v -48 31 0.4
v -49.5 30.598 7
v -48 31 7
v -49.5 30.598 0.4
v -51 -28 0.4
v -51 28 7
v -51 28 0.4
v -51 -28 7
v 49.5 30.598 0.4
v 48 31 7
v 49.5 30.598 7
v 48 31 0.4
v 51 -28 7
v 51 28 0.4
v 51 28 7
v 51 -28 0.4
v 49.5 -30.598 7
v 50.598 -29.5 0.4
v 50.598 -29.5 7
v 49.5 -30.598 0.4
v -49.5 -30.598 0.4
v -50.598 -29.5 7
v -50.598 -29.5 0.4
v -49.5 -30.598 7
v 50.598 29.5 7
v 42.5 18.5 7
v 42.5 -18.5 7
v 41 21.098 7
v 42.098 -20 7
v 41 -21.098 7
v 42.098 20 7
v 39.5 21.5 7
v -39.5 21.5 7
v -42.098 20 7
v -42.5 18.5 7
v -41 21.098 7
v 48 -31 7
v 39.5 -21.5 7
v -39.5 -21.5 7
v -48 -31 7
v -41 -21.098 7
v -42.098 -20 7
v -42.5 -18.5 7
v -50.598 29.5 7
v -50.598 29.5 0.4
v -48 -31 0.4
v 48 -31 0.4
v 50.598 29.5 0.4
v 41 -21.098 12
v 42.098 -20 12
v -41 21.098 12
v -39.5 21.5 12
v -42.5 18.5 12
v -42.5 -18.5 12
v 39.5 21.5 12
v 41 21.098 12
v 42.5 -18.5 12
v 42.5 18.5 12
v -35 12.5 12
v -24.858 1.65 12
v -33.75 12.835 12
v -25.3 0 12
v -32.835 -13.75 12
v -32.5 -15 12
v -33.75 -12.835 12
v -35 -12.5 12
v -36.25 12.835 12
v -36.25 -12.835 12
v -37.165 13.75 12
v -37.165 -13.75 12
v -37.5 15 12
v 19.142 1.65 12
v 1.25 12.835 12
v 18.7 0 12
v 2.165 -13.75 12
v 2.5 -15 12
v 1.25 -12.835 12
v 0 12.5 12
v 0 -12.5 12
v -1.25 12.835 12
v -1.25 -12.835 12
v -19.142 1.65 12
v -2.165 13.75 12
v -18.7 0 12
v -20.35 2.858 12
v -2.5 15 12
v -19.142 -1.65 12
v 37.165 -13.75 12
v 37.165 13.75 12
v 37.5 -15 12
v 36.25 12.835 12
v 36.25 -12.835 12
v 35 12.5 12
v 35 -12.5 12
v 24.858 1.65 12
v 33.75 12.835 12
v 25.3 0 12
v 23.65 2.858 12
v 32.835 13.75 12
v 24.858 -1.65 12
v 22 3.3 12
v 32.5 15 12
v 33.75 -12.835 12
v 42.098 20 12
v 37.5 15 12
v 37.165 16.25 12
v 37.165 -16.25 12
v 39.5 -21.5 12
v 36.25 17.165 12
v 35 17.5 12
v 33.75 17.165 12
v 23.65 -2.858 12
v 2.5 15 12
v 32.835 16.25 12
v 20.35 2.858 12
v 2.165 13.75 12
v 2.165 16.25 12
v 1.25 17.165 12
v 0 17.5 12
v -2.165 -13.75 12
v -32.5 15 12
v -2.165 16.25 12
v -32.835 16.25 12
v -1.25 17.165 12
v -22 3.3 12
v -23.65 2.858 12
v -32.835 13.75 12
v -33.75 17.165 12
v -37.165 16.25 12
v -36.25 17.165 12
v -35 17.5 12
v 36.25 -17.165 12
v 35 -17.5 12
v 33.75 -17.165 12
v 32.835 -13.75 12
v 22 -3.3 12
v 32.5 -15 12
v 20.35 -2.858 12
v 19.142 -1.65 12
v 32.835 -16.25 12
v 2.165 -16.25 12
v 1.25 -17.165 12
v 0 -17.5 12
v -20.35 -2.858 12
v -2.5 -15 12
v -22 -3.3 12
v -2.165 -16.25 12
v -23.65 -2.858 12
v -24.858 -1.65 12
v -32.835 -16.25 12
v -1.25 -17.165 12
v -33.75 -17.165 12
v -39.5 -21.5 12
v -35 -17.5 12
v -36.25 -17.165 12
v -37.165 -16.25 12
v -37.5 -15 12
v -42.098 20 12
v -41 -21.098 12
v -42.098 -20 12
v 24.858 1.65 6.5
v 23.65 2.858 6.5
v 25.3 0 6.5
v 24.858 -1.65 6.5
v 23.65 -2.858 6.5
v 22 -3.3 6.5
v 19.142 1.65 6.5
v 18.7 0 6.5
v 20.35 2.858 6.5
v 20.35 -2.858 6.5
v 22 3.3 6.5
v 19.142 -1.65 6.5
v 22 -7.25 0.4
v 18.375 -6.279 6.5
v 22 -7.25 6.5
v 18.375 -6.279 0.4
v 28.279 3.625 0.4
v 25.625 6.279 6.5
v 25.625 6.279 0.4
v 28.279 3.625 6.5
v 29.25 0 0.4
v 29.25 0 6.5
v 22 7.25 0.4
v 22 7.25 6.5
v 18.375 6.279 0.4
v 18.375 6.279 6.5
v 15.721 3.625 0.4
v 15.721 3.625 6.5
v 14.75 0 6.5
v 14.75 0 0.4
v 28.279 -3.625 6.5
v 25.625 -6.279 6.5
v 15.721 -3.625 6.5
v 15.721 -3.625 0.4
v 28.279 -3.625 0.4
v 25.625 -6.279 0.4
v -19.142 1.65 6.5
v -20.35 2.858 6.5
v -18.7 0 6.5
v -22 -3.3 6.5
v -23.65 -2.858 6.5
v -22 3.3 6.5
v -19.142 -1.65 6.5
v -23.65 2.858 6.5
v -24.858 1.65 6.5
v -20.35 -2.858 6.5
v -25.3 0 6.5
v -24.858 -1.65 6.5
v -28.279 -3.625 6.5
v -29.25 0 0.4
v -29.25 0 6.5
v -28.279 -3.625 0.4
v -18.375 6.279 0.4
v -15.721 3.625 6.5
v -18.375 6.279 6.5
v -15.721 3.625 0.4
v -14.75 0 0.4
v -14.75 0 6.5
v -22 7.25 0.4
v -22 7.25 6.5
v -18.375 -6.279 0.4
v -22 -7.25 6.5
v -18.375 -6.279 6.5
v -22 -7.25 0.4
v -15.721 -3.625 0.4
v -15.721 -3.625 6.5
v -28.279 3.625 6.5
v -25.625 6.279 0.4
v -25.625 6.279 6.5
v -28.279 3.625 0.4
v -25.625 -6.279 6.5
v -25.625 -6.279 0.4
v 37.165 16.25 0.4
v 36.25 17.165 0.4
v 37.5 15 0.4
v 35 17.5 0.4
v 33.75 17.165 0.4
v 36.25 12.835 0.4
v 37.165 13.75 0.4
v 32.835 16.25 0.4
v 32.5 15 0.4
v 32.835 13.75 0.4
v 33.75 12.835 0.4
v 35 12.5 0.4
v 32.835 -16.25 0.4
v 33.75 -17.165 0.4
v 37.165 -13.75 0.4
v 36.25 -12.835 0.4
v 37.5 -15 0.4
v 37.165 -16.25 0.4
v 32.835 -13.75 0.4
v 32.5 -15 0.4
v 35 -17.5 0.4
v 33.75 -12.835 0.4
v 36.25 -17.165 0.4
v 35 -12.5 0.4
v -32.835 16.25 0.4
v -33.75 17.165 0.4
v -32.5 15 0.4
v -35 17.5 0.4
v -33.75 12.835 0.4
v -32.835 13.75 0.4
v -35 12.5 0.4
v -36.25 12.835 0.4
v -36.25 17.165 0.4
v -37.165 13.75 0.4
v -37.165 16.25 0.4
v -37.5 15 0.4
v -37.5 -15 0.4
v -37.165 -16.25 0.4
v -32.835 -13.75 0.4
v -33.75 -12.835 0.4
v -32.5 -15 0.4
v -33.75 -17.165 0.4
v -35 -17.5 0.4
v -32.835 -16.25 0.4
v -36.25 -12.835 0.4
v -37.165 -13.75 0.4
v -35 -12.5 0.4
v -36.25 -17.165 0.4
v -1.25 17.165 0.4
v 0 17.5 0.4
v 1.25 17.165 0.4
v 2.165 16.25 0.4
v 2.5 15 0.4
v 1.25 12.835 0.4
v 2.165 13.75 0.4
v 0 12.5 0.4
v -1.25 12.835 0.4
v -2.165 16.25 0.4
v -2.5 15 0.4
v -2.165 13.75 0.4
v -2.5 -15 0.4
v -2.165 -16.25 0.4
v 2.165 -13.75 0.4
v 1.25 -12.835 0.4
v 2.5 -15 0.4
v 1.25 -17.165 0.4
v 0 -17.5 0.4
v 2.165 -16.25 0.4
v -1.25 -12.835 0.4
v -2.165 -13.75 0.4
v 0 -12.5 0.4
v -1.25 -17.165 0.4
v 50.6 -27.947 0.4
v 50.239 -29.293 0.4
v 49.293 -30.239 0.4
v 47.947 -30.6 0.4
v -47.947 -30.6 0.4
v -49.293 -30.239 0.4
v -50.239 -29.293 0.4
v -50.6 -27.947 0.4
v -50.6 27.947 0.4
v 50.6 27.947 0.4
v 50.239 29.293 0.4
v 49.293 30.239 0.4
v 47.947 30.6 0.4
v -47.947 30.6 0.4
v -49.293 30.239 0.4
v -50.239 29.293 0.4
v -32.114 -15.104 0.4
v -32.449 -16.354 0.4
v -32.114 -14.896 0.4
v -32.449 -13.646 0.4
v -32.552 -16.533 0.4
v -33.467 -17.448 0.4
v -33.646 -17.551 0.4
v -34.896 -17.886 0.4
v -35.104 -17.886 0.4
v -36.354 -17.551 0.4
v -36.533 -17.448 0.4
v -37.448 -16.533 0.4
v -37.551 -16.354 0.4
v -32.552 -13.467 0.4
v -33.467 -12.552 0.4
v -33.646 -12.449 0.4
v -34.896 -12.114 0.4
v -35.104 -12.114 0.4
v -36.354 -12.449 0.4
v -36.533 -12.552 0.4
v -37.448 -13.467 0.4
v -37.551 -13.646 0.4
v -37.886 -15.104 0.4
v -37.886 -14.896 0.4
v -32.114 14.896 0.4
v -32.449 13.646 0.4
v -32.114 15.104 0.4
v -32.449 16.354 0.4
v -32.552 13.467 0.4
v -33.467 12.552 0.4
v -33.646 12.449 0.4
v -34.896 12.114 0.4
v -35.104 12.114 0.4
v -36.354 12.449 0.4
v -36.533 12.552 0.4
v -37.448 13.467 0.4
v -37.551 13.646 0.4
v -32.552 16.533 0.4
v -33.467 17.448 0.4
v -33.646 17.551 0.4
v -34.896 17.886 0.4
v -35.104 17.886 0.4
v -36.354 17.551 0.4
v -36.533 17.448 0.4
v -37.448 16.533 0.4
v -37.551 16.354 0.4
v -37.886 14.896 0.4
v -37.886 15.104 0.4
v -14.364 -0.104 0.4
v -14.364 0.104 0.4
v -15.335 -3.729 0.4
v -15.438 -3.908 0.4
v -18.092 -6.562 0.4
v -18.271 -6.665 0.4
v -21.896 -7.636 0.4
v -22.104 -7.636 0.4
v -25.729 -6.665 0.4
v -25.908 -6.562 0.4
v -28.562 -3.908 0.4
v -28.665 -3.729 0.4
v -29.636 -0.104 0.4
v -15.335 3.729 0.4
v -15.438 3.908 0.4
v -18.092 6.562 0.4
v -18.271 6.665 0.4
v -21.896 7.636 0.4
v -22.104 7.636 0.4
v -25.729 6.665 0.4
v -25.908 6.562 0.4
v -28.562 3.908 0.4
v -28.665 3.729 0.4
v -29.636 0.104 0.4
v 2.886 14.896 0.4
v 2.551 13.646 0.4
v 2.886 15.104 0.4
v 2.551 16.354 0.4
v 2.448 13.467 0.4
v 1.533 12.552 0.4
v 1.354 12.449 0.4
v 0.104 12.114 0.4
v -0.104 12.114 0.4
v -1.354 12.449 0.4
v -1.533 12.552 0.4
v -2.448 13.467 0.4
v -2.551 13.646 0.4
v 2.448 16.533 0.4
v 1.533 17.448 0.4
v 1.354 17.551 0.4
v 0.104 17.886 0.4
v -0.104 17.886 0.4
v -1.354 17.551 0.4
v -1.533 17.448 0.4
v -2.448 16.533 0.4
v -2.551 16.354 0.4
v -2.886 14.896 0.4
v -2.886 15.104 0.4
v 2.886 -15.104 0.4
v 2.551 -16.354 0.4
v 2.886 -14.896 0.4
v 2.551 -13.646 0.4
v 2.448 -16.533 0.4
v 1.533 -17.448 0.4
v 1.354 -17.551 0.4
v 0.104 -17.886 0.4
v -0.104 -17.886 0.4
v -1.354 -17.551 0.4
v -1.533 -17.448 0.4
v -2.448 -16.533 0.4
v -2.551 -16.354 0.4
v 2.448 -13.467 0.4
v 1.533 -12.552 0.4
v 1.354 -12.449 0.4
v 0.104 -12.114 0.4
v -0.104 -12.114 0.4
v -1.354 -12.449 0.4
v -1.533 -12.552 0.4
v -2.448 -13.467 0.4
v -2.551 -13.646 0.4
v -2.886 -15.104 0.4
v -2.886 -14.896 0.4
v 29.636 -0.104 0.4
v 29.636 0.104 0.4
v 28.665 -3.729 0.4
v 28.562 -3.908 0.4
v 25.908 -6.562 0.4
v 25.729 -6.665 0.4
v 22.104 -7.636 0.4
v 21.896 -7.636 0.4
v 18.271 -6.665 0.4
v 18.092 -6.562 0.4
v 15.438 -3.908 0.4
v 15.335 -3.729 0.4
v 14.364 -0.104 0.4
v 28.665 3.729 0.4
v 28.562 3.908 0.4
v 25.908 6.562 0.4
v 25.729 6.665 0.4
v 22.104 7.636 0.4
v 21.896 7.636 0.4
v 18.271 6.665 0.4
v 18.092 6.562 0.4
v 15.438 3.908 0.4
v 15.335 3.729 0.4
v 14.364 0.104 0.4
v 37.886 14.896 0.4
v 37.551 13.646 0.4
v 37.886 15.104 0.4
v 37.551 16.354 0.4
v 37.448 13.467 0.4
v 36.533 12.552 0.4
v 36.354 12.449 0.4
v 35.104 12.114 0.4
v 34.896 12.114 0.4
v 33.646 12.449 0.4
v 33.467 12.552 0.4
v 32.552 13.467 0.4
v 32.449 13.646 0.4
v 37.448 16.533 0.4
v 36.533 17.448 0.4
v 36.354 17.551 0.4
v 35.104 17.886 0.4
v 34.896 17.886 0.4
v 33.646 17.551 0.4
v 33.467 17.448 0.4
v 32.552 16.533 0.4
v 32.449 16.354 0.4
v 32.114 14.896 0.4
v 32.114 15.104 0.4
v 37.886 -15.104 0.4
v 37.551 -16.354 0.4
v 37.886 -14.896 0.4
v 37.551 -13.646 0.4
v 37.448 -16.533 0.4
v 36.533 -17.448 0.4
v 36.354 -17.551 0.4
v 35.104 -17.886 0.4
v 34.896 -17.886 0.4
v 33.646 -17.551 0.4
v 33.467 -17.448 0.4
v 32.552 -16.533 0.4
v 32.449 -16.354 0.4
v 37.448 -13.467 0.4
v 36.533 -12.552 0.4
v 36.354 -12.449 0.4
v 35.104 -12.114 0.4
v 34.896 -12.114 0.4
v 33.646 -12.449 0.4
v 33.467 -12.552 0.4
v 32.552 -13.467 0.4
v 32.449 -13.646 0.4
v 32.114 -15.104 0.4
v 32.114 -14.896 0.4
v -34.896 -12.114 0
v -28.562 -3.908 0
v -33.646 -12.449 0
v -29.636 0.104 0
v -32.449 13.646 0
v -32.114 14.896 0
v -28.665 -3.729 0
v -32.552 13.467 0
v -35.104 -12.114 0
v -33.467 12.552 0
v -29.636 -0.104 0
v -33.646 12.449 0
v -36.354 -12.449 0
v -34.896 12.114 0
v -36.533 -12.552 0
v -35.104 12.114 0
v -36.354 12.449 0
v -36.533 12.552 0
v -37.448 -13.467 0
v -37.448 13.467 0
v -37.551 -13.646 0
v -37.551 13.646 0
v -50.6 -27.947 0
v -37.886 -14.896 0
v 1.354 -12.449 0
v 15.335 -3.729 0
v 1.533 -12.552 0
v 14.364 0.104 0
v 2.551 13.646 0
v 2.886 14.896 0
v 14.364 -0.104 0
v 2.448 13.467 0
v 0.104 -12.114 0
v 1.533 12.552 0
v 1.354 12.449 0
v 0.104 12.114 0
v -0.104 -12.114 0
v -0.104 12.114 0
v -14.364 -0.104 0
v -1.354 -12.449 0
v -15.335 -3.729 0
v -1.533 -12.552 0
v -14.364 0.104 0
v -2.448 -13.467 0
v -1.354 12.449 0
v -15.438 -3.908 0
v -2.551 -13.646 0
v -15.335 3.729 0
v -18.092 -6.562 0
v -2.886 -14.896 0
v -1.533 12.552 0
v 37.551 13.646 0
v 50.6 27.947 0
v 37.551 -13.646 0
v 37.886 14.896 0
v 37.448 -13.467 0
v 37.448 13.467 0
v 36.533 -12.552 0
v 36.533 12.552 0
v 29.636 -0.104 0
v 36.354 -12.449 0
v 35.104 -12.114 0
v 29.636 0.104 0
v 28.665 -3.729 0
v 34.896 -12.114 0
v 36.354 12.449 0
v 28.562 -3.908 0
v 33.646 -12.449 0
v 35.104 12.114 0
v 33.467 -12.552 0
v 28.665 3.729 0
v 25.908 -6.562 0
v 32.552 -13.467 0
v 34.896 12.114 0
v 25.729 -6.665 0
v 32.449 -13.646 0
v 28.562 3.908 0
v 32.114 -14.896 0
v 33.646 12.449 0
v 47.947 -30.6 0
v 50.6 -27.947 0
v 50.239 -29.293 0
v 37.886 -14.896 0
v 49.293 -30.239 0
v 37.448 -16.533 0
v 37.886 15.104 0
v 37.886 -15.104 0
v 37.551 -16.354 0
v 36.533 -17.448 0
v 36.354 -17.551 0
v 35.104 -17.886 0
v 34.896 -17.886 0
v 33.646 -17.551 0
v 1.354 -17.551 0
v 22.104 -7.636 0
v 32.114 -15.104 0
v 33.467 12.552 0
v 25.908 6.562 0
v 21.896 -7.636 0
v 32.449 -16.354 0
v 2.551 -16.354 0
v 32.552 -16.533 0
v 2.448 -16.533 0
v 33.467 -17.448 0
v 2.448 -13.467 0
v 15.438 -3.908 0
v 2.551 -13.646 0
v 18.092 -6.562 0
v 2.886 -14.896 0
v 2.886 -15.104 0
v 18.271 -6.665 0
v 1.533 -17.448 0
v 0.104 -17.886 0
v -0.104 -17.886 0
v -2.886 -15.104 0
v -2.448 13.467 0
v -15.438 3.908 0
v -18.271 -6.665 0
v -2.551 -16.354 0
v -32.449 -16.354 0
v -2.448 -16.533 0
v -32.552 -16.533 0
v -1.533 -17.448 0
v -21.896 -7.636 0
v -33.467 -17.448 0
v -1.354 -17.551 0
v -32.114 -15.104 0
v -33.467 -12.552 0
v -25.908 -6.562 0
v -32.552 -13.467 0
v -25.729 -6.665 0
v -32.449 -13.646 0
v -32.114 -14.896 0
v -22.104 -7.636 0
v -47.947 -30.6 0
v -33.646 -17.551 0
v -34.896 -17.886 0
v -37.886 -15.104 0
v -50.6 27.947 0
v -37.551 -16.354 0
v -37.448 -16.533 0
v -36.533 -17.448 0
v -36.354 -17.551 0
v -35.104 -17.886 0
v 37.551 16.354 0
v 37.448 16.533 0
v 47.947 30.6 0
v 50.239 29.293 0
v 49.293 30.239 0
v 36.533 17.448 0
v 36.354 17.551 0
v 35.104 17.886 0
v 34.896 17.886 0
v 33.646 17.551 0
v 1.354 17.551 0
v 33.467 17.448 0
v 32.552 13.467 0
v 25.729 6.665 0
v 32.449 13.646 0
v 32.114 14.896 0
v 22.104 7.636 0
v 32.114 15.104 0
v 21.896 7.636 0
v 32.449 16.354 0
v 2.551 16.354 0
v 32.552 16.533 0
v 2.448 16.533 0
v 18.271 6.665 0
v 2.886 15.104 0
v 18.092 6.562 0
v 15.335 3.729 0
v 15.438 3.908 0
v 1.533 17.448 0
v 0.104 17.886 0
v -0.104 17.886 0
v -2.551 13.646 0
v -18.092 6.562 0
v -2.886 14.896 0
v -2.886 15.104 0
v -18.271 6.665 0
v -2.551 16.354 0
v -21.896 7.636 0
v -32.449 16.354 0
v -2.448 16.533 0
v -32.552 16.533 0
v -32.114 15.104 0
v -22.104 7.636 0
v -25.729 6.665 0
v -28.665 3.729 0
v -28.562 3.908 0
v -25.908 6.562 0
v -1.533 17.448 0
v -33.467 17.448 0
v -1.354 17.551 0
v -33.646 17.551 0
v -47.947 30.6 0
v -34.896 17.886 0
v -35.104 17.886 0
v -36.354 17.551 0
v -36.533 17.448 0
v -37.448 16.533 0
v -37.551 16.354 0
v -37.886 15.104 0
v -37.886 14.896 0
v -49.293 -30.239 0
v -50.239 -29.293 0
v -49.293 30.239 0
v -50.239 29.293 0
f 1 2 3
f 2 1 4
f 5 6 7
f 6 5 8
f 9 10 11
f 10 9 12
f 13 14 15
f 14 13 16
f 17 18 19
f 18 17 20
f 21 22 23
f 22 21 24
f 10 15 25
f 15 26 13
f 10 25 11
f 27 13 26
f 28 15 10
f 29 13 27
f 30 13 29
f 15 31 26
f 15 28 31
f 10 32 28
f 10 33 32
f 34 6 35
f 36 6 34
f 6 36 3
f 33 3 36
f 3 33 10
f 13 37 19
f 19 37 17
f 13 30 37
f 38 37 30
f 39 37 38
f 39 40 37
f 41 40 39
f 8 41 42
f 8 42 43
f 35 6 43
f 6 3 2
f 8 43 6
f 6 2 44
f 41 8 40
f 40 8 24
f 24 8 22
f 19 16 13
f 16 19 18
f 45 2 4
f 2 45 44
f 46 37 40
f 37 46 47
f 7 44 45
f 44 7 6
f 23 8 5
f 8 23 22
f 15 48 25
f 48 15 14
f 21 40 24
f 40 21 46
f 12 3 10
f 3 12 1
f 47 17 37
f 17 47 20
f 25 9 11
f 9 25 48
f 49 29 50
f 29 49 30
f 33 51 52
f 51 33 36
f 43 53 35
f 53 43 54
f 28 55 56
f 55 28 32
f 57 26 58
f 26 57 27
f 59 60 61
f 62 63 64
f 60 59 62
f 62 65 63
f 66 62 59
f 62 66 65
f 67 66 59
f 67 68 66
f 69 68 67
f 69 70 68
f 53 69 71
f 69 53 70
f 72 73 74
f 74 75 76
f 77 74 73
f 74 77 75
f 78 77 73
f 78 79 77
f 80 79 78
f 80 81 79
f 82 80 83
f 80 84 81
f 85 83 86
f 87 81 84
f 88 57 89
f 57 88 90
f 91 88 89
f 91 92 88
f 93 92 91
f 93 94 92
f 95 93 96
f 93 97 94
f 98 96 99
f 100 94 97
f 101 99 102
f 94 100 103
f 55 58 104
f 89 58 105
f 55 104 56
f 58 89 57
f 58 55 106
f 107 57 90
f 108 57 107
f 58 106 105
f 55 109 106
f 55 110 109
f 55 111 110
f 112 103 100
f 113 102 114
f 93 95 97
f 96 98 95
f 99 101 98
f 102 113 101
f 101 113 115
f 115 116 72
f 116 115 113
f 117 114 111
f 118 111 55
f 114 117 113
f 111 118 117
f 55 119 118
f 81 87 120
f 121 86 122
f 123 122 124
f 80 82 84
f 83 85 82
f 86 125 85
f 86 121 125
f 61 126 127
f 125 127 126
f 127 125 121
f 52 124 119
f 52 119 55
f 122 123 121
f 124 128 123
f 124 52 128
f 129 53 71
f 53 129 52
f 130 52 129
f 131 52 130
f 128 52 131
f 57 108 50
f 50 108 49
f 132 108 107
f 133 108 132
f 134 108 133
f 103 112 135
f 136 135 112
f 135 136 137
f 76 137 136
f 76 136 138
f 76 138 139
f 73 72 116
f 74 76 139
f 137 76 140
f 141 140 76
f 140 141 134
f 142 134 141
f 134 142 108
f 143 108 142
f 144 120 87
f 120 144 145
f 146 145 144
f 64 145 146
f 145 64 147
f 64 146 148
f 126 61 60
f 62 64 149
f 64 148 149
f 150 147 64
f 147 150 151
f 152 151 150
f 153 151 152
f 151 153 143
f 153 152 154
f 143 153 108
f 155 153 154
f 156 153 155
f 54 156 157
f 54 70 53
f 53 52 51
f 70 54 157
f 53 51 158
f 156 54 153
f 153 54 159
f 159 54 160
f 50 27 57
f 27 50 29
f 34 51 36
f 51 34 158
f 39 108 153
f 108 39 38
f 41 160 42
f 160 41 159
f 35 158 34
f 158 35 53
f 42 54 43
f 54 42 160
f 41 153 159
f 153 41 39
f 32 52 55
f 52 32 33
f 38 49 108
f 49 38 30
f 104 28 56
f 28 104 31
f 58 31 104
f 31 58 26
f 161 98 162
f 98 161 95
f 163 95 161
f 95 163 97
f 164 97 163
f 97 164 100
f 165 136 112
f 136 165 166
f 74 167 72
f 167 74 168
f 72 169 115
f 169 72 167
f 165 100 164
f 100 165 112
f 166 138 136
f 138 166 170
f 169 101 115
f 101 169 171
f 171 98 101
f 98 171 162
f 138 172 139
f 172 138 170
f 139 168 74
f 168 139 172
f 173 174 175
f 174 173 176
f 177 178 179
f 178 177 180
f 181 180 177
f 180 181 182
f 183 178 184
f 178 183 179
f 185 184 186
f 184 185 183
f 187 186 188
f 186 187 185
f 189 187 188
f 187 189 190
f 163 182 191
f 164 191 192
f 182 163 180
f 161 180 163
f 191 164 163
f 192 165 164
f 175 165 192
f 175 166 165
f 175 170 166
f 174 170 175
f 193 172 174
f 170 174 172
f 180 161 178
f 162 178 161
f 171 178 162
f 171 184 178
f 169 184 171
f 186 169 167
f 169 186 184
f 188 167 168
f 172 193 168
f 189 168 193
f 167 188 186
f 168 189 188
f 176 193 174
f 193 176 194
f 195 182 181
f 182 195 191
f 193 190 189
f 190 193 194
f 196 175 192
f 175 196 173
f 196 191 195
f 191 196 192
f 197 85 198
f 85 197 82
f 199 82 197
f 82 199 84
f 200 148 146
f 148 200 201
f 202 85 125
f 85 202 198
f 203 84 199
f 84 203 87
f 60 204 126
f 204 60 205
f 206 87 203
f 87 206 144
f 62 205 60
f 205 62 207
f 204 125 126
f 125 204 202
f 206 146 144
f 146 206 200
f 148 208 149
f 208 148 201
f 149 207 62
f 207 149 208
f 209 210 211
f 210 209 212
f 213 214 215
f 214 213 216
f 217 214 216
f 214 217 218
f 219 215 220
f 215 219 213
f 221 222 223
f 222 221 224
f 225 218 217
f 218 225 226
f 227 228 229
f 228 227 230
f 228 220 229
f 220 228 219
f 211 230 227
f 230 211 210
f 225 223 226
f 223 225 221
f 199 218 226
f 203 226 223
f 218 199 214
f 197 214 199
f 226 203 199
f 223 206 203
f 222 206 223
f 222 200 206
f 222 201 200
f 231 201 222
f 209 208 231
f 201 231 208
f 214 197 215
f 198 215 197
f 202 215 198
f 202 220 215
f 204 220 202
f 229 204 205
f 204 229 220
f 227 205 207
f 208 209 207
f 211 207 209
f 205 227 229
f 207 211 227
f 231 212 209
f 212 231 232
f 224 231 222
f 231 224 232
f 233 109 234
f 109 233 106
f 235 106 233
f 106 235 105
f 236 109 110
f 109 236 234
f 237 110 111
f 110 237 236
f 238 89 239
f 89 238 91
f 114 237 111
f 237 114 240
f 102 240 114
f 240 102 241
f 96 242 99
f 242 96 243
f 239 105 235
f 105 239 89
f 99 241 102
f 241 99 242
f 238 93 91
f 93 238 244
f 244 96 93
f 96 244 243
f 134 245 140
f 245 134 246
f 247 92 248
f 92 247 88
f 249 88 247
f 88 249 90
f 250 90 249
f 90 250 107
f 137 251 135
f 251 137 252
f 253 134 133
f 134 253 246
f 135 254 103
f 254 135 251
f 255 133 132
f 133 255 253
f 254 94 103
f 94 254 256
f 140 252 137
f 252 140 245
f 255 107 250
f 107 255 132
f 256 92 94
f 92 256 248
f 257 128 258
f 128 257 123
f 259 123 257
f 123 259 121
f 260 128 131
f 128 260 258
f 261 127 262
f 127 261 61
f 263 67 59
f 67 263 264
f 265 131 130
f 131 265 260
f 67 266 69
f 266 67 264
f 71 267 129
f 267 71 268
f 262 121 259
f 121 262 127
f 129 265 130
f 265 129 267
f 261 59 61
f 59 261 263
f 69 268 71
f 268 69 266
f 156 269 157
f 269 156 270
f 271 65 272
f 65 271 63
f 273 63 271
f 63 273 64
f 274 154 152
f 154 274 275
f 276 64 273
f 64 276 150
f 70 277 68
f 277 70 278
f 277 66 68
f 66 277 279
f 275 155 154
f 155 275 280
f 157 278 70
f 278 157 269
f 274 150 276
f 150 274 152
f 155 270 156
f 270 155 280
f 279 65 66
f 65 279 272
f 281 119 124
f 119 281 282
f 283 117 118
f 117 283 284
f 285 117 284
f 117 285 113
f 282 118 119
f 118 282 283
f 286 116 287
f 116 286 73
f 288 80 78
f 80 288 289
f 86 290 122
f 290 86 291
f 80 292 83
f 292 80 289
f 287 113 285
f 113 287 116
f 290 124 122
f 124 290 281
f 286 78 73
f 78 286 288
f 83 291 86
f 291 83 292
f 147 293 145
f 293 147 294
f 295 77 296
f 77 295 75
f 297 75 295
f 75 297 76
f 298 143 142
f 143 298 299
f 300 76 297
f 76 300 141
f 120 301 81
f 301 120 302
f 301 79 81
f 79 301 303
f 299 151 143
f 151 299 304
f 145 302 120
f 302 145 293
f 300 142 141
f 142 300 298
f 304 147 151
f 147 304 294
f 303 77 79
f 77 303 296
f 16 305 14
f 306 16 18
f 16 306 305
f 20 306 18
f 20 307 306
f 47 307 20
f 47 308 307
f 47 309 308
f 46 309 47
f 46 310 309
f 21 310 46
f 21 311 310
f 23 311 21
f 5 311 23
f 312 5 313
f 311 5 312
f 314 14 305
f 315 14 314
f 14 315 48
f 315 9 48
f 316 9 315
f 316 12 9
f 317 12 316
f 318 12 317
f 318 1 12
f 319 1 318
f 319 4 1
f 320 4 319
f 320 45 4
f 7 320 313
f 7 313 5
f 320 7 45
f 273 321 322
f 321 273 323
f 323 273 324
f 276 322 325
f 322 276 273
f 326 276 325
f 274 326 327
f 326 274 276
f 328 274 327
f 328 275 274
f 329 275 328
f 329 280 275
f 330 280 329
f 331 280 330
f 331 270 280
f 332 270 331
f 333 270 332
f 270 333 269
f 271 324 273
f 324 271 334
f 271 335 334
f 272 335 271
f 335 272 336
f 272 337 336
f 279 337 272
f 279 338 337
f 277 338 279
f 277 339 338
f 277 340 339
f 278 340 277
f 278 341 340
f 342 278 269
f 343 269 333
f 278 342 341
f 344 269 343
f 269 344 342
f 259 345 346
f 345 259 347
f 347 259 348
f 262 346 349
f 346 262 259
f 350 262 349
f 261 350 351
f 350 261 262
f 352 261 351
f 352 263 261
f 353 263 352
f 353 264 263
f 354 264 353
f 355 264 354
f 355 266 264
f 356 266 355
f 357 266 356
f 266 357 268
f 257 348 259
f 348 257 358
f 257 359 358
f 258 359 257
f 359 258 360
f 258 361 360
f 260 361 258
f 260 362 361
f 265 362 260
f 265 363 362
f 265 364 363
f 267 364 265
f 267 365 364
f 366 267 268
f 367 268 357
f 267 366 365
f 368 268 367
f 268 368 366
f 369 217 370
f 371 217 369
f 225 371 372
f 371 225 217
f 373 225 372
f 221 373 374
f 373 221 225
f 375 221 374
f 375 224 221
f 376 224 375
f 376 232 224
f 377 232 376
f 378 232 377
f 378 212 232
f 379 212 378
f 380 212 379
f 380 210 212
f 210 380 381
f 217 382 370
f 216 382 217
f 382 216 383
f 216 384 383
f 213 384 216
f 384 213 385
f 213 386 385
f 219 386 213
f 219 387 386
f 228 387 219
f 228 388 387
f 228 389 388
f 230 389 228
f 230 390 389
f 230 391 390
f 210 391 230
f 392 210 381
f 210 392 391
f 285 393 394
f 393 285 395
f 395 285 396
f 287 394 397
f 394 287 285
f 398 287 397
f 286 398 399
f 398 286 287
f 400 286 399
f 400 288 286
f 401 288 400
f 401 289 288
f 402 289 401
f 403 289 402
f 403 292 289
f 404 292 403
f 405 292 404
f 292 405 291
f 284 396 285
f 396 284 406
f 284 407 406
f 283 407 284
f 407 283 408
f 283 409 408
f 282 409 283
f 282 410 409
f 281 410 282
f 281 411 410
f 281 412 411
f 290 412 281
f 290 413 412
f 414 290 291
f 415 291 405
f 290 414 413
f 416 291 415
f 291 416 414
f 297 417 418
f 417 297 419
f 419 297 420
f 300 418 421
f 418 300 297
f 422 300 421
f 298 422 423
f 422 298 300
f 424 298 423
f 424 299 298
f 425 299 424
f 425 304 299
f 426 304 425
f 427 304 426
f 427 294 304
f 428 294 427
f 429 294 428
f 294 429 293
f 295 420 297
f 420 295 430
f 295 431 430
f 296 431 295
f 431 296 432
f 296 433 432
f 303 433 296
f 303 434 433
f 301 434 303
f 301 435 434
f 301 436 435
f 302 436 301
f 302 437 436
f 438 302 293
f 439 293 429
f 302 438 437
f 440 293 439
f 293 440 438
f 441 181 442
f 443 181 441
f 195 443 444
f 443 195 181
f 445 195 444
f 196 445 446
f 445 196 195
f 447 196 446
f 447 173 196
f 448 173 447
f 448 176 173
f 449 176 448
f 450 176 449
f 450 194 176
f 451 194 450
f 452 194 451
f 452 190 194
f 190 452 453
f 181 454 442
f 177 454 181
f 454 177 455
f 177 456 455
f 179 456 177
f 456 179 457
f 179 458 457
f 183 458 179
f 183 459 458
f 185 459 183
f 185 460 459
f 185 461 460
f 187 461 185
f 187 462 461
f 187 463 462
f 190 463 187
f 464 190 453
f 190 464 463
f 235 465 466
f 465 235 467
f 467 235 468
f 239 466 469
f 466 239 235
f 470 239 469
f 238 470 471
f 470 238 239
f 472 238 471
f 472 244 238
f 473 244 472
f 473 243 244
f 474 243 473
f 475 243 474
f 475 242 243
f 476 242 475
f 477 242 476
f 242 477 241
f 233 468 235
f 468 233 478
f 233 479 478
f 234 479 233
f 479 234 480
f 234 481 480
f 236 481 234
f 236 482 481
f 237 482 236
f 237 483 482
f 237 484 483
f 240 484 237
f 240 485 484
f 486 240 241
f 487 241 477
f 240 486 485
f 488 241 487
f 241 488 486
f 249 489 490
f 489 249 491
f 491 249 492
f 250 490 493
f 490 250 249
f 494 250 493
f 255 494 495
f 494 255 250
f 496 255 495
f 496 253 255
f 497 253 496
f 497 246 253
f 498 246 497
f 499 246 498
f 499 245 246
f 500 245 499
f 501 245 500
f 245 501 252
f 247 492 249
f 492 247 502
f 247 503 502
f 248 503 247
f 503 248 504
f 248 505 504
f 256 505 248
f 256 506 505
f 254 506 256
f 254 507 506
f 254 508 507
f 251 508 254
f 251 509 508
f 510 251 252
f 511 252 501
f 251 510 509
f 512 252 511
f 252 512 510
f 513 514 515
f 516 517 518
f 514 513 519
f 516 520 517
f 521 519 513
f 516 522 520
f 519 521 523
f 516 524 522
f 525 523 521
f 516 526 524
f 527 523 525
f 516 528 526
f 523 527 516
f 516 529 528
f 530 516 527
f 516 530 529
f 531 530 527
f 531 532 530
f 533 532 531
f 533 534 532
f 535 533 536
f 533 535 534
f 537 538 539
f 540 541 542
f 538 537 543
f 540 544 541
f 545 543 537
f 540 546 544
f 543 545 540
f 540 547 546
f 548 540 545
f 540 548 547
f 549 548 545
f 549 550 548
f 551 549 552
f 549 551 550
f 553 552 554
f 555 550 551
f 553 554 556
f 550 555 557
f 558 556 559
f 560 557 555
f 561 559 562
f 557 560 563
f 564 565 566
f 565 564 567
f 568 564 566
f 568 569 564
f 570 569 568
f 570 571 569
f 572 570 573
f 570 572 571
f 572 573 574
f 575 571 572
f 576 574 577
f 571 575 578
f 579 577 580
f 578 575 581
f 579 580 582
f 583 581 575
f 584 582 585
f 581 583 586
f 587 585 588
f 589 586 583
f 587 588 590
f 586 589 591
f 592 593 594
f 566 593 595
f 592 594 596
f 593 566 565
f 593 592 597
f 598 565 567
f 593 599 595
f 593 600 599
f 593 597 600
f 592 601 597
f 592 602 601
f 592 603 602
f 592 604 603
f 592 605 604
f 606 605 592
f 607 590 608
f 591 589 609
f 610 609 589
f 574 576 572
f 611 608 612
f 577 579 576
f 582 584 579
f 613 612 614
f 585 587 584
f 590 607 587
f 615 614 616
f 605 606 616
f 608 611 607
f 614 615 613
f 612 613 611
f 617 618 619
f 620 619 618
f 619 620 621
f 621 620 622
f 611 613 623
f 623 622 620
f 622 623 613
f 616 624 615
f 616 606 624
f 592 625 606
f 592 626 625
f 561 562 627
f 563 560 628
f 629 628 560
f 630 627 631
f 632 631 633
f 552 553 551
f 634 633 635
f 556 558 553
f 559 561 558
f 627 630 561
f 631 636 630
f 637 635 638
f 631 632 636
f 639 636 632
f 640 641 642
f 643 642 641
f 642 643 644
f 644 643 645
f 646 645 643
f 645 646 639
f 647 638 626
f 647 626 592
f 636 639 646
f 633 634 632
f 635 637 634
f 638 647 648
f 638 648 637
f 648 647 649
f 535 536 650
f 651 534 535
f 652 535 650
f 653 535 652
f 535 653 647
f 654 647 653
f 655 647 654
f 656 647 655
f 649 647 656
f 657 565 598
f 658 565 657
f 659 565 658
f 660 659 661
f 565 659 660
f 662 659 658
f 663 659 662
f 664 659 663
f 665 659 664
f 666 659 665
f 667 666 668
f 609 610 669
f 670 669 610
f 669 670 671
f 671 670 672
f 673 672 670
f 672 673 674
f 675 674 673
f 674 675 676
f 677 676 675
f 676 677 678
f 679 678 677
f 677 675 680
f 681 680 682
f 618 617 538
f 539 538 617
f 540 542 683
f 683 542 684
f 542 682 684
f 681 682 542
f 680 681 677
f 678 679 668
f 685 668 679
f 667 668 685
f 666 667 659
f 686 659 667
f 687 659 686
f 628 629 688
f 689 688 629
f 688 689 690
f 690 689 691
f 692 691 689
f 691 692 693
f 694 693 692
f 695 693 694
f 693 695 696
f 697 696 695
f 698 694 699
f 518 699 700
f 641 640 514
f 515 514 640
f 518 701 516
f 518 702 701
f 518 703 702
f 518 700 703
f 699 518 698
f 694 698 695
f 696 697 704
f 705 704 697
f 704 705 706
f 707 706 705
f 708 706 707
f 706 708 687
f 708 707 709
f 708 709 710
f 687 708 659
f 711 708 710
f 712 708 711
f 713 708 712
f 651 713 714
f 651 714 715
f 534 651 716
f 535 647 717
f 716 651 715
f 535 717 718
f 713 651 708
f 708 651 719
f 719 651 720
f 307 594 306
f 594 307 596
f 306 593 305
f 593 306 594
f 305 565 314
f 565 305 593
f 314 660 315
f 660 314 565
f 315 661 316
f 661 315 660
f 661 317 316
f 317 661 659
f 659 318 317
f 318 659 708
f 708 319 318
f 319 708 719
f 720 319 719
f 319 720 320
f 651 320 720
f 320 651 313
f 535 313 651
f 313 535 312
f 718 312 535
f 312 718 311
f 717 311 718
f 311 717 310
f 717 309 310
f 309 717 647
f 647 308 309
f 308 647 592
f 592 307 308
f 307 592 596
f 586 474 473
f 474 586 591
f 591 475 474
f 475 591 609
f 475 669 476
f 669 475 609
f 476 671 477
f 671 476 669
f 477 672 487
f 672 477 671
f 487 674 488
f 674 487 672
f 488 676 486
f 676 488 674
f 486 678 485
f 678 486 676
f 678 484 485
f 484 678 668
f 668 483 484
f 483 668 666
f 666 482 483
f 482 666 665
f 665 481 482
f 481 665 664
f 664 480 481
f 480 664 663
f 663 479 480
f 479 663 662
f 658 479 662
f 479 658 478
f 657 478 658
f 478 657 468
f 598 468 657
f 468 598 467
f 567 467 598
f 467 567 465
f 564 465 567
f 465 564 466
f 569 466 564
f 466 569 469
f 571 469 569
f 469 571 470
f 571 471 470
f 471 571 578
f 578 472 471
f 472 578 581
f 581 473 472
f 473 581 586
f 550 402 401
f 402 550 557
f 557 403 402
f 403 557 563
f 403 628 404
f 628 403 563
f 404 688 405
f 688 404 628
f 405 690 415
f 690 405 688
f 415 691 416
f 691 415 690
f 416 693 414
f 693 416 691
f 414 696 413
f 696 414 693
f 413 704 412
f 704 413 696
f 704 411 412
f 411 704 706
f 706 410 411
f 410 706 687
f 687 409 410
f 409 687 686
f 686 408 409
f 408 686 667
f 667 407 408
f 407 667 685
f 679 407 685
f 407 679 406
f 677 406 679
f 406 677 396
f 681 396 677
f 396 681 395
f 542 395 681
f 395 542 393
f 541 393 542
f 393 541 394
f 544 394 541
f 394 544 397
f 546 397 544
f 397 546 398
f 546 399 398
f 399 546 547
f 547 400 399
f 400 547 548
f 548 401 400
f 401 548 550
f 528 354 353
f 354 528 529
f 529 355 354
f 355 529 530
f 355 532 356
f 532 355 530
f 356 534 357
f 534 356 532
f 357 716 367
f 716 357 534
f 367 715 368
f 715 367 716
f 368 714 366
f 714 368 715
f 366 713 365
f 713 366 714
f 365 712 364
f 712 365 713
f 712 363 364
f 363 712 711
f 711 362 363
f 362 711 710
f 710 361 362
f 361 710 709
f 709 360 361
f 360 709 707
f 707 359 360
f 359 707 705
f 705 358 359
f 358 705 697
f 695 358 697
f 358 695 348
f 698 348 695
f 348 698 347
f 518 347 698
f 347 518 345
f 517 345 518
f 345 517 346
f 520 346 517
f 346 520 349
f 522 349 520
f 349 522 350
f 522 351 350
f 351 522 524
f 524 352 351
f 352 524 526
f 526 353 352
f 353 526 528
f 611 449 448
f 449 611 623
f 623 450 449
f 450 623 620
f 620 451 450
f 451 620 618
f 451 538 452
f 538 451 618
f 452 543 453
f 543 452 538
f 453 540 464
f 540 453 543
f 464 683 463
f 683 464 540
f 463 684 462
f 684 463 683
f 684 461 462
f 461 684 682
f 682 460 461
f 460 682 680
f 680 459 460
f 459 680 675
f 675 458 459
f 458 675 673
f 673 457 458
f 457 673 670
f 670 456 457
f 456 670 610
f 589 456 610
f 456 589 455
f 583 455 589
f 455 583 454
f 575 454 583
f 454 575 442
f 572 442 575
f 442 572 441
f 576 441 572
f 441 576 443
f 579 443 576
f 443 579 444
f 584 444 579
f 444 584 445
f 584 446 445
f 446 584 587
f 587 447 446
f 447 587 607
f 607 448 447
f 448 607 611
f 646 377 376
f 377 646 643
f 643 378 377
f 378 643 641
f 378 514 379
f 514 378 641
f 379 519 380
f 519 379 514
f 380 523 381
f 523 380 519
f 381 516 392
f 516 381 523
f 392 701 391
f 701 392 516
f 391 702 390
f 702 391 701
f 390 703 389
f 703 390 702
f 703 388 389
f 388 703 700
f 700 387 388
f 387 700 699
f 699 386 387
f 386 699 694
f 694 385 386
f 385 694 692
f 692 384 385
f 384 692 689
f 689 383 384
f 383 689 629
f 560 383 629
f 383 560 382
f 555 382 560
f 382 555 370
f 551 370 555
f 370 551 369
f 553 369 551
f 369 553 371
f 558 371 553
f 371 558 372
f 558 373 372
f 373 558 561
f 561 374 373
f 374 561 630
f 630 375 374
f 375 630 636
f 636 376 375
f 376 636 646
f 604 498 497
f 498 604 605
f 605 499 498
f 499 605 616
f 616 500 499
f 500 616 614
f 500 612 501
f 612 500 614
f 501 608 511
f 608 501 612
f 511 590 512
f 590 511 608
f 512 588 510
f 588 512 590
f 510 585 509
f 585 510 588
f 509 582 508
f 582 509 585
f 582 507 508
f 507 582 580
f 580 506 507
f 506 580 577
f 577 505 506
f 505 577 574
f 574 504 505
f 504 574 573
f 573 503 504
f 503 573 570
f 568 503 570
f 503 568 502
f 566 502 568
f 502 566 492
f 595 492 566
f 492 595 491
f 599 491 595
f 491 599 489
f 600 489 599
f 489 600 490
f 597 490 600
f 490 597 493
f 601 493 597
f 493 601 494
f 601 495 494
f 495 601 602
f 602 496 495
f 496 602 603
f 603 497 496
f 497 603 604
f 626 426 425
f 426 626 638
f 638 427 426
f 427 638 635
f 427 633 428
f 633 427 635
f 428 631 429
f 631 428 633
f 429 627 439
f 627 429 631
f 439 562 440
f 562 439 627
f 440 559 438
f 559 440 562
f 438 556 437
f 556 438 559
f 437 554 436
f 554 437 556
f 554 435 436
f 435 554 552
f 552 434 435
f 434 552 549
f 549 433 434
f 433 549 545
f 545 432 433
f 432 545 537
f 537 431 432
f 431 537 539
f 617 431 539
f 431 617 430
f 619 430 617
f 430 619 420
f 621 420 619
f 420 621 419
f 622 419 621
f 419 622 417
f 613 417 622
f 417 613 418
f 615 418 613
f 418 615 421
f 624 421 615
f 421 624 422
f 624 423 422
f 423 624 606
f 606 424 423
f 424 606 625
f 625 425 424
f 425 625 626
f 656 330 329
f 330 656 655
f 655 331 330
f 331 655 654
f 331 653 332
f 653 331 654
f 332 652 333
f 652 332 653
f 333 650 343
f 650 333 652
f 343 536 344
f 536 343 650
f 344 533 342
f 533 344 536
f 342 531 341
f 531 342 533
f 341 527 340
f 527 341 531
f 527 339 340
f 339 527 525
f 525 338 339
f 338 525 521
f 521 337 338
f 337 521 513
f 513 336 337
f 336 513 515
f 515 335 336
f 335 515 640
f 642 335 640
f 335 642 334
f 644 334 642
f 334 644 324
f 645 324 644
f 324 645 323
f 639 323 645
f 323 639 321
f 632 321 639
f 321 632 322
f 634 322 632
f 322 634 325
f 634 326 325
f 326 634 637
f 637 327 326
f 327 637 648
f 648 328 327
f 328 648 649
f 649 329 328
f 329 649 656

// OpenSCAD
// A wedge base for Ring.com Doorbell. Calibrated for the Pro version.

// Adding '0' to hide from Thingiverse customizer.
eps1 = 0.01 + 0;
eps2 = 2*eps1;

// Round faces smoothness.
$fn=12;

module inset_bottom(w=0.4, h=0.2, bounding_size = 200, eps=0.01) {
  if (w == 0 || h < 0) {
    children();
  } else {
    // The top part of the children without the inset layer.
    difference() {
      children();
      // TODO: use actual extended children projection instead
      // of a clube with arbitrary large x,y values.
      translate([0, 0, -9*h]) 
          cube([bounding_size, bounding_size, 20*h], center=true);
    }
    // The inset layer.
    linear_extrude(height=h+eps) offset(r = -w) projection(cut=true)
      children();
  }
}

module corner_post(l, w, h, r) {
     translate([l/2-r, w/2-r, 0]) 
      cylinder(r=r, h=h);  
}

module rounded_block(l, w, h, r) {
  hull() {
    corner_post(l, w, h, r);
    mirror([1, 0, 0]) corner_post(l, w, h, r);
    mirror([0, 1, 0]) corner_post(l, w, h, r);
    mirror([1, 0, 0]) mirror([0, 1, 0]) corner_post(l, w, h, r);
  } 
}

module hole(d, h, x, y) {
  translate([x, y, -eps1]) cylinder(d=d, h=h+eps1);
}

module holes() {
  dx = 22;
  d1 = 6.6;
  d2 = 14.5;
  
  hole(d1, 30, dx, 0);
  hole(d2, 6.5, dx, 0);
  
  hole(d1, 30, -dx, 0);
  hole(d2, 6.5, -dx, 0);
  
  // For strength
  hole(5, 30, 35, 15);  
  hole(5, 30, 35, -15);  
  hole(5, 30, -35, 15);  
  hole(5, 30, -35, -15);  
  
  hole(5, 30, 0, 15);  
  hole(5, 30, 0, -15);
}

inset_bottom(w=0.4, h=0.4)
difference() {
  union() {
    rounded_block(102, 62, 7, 3);
    // For crooked leg
    //rotate([0, 1.35, 0]) translate([0, 0, -1])
      rounded_block(85, 43, 12, 3);
  }
  holes();
}

//difference() {
//  cylinder(d=40, h=1);
//  translate([0, 0, -1]) cylinder(d=6.5, h=10);
//}
